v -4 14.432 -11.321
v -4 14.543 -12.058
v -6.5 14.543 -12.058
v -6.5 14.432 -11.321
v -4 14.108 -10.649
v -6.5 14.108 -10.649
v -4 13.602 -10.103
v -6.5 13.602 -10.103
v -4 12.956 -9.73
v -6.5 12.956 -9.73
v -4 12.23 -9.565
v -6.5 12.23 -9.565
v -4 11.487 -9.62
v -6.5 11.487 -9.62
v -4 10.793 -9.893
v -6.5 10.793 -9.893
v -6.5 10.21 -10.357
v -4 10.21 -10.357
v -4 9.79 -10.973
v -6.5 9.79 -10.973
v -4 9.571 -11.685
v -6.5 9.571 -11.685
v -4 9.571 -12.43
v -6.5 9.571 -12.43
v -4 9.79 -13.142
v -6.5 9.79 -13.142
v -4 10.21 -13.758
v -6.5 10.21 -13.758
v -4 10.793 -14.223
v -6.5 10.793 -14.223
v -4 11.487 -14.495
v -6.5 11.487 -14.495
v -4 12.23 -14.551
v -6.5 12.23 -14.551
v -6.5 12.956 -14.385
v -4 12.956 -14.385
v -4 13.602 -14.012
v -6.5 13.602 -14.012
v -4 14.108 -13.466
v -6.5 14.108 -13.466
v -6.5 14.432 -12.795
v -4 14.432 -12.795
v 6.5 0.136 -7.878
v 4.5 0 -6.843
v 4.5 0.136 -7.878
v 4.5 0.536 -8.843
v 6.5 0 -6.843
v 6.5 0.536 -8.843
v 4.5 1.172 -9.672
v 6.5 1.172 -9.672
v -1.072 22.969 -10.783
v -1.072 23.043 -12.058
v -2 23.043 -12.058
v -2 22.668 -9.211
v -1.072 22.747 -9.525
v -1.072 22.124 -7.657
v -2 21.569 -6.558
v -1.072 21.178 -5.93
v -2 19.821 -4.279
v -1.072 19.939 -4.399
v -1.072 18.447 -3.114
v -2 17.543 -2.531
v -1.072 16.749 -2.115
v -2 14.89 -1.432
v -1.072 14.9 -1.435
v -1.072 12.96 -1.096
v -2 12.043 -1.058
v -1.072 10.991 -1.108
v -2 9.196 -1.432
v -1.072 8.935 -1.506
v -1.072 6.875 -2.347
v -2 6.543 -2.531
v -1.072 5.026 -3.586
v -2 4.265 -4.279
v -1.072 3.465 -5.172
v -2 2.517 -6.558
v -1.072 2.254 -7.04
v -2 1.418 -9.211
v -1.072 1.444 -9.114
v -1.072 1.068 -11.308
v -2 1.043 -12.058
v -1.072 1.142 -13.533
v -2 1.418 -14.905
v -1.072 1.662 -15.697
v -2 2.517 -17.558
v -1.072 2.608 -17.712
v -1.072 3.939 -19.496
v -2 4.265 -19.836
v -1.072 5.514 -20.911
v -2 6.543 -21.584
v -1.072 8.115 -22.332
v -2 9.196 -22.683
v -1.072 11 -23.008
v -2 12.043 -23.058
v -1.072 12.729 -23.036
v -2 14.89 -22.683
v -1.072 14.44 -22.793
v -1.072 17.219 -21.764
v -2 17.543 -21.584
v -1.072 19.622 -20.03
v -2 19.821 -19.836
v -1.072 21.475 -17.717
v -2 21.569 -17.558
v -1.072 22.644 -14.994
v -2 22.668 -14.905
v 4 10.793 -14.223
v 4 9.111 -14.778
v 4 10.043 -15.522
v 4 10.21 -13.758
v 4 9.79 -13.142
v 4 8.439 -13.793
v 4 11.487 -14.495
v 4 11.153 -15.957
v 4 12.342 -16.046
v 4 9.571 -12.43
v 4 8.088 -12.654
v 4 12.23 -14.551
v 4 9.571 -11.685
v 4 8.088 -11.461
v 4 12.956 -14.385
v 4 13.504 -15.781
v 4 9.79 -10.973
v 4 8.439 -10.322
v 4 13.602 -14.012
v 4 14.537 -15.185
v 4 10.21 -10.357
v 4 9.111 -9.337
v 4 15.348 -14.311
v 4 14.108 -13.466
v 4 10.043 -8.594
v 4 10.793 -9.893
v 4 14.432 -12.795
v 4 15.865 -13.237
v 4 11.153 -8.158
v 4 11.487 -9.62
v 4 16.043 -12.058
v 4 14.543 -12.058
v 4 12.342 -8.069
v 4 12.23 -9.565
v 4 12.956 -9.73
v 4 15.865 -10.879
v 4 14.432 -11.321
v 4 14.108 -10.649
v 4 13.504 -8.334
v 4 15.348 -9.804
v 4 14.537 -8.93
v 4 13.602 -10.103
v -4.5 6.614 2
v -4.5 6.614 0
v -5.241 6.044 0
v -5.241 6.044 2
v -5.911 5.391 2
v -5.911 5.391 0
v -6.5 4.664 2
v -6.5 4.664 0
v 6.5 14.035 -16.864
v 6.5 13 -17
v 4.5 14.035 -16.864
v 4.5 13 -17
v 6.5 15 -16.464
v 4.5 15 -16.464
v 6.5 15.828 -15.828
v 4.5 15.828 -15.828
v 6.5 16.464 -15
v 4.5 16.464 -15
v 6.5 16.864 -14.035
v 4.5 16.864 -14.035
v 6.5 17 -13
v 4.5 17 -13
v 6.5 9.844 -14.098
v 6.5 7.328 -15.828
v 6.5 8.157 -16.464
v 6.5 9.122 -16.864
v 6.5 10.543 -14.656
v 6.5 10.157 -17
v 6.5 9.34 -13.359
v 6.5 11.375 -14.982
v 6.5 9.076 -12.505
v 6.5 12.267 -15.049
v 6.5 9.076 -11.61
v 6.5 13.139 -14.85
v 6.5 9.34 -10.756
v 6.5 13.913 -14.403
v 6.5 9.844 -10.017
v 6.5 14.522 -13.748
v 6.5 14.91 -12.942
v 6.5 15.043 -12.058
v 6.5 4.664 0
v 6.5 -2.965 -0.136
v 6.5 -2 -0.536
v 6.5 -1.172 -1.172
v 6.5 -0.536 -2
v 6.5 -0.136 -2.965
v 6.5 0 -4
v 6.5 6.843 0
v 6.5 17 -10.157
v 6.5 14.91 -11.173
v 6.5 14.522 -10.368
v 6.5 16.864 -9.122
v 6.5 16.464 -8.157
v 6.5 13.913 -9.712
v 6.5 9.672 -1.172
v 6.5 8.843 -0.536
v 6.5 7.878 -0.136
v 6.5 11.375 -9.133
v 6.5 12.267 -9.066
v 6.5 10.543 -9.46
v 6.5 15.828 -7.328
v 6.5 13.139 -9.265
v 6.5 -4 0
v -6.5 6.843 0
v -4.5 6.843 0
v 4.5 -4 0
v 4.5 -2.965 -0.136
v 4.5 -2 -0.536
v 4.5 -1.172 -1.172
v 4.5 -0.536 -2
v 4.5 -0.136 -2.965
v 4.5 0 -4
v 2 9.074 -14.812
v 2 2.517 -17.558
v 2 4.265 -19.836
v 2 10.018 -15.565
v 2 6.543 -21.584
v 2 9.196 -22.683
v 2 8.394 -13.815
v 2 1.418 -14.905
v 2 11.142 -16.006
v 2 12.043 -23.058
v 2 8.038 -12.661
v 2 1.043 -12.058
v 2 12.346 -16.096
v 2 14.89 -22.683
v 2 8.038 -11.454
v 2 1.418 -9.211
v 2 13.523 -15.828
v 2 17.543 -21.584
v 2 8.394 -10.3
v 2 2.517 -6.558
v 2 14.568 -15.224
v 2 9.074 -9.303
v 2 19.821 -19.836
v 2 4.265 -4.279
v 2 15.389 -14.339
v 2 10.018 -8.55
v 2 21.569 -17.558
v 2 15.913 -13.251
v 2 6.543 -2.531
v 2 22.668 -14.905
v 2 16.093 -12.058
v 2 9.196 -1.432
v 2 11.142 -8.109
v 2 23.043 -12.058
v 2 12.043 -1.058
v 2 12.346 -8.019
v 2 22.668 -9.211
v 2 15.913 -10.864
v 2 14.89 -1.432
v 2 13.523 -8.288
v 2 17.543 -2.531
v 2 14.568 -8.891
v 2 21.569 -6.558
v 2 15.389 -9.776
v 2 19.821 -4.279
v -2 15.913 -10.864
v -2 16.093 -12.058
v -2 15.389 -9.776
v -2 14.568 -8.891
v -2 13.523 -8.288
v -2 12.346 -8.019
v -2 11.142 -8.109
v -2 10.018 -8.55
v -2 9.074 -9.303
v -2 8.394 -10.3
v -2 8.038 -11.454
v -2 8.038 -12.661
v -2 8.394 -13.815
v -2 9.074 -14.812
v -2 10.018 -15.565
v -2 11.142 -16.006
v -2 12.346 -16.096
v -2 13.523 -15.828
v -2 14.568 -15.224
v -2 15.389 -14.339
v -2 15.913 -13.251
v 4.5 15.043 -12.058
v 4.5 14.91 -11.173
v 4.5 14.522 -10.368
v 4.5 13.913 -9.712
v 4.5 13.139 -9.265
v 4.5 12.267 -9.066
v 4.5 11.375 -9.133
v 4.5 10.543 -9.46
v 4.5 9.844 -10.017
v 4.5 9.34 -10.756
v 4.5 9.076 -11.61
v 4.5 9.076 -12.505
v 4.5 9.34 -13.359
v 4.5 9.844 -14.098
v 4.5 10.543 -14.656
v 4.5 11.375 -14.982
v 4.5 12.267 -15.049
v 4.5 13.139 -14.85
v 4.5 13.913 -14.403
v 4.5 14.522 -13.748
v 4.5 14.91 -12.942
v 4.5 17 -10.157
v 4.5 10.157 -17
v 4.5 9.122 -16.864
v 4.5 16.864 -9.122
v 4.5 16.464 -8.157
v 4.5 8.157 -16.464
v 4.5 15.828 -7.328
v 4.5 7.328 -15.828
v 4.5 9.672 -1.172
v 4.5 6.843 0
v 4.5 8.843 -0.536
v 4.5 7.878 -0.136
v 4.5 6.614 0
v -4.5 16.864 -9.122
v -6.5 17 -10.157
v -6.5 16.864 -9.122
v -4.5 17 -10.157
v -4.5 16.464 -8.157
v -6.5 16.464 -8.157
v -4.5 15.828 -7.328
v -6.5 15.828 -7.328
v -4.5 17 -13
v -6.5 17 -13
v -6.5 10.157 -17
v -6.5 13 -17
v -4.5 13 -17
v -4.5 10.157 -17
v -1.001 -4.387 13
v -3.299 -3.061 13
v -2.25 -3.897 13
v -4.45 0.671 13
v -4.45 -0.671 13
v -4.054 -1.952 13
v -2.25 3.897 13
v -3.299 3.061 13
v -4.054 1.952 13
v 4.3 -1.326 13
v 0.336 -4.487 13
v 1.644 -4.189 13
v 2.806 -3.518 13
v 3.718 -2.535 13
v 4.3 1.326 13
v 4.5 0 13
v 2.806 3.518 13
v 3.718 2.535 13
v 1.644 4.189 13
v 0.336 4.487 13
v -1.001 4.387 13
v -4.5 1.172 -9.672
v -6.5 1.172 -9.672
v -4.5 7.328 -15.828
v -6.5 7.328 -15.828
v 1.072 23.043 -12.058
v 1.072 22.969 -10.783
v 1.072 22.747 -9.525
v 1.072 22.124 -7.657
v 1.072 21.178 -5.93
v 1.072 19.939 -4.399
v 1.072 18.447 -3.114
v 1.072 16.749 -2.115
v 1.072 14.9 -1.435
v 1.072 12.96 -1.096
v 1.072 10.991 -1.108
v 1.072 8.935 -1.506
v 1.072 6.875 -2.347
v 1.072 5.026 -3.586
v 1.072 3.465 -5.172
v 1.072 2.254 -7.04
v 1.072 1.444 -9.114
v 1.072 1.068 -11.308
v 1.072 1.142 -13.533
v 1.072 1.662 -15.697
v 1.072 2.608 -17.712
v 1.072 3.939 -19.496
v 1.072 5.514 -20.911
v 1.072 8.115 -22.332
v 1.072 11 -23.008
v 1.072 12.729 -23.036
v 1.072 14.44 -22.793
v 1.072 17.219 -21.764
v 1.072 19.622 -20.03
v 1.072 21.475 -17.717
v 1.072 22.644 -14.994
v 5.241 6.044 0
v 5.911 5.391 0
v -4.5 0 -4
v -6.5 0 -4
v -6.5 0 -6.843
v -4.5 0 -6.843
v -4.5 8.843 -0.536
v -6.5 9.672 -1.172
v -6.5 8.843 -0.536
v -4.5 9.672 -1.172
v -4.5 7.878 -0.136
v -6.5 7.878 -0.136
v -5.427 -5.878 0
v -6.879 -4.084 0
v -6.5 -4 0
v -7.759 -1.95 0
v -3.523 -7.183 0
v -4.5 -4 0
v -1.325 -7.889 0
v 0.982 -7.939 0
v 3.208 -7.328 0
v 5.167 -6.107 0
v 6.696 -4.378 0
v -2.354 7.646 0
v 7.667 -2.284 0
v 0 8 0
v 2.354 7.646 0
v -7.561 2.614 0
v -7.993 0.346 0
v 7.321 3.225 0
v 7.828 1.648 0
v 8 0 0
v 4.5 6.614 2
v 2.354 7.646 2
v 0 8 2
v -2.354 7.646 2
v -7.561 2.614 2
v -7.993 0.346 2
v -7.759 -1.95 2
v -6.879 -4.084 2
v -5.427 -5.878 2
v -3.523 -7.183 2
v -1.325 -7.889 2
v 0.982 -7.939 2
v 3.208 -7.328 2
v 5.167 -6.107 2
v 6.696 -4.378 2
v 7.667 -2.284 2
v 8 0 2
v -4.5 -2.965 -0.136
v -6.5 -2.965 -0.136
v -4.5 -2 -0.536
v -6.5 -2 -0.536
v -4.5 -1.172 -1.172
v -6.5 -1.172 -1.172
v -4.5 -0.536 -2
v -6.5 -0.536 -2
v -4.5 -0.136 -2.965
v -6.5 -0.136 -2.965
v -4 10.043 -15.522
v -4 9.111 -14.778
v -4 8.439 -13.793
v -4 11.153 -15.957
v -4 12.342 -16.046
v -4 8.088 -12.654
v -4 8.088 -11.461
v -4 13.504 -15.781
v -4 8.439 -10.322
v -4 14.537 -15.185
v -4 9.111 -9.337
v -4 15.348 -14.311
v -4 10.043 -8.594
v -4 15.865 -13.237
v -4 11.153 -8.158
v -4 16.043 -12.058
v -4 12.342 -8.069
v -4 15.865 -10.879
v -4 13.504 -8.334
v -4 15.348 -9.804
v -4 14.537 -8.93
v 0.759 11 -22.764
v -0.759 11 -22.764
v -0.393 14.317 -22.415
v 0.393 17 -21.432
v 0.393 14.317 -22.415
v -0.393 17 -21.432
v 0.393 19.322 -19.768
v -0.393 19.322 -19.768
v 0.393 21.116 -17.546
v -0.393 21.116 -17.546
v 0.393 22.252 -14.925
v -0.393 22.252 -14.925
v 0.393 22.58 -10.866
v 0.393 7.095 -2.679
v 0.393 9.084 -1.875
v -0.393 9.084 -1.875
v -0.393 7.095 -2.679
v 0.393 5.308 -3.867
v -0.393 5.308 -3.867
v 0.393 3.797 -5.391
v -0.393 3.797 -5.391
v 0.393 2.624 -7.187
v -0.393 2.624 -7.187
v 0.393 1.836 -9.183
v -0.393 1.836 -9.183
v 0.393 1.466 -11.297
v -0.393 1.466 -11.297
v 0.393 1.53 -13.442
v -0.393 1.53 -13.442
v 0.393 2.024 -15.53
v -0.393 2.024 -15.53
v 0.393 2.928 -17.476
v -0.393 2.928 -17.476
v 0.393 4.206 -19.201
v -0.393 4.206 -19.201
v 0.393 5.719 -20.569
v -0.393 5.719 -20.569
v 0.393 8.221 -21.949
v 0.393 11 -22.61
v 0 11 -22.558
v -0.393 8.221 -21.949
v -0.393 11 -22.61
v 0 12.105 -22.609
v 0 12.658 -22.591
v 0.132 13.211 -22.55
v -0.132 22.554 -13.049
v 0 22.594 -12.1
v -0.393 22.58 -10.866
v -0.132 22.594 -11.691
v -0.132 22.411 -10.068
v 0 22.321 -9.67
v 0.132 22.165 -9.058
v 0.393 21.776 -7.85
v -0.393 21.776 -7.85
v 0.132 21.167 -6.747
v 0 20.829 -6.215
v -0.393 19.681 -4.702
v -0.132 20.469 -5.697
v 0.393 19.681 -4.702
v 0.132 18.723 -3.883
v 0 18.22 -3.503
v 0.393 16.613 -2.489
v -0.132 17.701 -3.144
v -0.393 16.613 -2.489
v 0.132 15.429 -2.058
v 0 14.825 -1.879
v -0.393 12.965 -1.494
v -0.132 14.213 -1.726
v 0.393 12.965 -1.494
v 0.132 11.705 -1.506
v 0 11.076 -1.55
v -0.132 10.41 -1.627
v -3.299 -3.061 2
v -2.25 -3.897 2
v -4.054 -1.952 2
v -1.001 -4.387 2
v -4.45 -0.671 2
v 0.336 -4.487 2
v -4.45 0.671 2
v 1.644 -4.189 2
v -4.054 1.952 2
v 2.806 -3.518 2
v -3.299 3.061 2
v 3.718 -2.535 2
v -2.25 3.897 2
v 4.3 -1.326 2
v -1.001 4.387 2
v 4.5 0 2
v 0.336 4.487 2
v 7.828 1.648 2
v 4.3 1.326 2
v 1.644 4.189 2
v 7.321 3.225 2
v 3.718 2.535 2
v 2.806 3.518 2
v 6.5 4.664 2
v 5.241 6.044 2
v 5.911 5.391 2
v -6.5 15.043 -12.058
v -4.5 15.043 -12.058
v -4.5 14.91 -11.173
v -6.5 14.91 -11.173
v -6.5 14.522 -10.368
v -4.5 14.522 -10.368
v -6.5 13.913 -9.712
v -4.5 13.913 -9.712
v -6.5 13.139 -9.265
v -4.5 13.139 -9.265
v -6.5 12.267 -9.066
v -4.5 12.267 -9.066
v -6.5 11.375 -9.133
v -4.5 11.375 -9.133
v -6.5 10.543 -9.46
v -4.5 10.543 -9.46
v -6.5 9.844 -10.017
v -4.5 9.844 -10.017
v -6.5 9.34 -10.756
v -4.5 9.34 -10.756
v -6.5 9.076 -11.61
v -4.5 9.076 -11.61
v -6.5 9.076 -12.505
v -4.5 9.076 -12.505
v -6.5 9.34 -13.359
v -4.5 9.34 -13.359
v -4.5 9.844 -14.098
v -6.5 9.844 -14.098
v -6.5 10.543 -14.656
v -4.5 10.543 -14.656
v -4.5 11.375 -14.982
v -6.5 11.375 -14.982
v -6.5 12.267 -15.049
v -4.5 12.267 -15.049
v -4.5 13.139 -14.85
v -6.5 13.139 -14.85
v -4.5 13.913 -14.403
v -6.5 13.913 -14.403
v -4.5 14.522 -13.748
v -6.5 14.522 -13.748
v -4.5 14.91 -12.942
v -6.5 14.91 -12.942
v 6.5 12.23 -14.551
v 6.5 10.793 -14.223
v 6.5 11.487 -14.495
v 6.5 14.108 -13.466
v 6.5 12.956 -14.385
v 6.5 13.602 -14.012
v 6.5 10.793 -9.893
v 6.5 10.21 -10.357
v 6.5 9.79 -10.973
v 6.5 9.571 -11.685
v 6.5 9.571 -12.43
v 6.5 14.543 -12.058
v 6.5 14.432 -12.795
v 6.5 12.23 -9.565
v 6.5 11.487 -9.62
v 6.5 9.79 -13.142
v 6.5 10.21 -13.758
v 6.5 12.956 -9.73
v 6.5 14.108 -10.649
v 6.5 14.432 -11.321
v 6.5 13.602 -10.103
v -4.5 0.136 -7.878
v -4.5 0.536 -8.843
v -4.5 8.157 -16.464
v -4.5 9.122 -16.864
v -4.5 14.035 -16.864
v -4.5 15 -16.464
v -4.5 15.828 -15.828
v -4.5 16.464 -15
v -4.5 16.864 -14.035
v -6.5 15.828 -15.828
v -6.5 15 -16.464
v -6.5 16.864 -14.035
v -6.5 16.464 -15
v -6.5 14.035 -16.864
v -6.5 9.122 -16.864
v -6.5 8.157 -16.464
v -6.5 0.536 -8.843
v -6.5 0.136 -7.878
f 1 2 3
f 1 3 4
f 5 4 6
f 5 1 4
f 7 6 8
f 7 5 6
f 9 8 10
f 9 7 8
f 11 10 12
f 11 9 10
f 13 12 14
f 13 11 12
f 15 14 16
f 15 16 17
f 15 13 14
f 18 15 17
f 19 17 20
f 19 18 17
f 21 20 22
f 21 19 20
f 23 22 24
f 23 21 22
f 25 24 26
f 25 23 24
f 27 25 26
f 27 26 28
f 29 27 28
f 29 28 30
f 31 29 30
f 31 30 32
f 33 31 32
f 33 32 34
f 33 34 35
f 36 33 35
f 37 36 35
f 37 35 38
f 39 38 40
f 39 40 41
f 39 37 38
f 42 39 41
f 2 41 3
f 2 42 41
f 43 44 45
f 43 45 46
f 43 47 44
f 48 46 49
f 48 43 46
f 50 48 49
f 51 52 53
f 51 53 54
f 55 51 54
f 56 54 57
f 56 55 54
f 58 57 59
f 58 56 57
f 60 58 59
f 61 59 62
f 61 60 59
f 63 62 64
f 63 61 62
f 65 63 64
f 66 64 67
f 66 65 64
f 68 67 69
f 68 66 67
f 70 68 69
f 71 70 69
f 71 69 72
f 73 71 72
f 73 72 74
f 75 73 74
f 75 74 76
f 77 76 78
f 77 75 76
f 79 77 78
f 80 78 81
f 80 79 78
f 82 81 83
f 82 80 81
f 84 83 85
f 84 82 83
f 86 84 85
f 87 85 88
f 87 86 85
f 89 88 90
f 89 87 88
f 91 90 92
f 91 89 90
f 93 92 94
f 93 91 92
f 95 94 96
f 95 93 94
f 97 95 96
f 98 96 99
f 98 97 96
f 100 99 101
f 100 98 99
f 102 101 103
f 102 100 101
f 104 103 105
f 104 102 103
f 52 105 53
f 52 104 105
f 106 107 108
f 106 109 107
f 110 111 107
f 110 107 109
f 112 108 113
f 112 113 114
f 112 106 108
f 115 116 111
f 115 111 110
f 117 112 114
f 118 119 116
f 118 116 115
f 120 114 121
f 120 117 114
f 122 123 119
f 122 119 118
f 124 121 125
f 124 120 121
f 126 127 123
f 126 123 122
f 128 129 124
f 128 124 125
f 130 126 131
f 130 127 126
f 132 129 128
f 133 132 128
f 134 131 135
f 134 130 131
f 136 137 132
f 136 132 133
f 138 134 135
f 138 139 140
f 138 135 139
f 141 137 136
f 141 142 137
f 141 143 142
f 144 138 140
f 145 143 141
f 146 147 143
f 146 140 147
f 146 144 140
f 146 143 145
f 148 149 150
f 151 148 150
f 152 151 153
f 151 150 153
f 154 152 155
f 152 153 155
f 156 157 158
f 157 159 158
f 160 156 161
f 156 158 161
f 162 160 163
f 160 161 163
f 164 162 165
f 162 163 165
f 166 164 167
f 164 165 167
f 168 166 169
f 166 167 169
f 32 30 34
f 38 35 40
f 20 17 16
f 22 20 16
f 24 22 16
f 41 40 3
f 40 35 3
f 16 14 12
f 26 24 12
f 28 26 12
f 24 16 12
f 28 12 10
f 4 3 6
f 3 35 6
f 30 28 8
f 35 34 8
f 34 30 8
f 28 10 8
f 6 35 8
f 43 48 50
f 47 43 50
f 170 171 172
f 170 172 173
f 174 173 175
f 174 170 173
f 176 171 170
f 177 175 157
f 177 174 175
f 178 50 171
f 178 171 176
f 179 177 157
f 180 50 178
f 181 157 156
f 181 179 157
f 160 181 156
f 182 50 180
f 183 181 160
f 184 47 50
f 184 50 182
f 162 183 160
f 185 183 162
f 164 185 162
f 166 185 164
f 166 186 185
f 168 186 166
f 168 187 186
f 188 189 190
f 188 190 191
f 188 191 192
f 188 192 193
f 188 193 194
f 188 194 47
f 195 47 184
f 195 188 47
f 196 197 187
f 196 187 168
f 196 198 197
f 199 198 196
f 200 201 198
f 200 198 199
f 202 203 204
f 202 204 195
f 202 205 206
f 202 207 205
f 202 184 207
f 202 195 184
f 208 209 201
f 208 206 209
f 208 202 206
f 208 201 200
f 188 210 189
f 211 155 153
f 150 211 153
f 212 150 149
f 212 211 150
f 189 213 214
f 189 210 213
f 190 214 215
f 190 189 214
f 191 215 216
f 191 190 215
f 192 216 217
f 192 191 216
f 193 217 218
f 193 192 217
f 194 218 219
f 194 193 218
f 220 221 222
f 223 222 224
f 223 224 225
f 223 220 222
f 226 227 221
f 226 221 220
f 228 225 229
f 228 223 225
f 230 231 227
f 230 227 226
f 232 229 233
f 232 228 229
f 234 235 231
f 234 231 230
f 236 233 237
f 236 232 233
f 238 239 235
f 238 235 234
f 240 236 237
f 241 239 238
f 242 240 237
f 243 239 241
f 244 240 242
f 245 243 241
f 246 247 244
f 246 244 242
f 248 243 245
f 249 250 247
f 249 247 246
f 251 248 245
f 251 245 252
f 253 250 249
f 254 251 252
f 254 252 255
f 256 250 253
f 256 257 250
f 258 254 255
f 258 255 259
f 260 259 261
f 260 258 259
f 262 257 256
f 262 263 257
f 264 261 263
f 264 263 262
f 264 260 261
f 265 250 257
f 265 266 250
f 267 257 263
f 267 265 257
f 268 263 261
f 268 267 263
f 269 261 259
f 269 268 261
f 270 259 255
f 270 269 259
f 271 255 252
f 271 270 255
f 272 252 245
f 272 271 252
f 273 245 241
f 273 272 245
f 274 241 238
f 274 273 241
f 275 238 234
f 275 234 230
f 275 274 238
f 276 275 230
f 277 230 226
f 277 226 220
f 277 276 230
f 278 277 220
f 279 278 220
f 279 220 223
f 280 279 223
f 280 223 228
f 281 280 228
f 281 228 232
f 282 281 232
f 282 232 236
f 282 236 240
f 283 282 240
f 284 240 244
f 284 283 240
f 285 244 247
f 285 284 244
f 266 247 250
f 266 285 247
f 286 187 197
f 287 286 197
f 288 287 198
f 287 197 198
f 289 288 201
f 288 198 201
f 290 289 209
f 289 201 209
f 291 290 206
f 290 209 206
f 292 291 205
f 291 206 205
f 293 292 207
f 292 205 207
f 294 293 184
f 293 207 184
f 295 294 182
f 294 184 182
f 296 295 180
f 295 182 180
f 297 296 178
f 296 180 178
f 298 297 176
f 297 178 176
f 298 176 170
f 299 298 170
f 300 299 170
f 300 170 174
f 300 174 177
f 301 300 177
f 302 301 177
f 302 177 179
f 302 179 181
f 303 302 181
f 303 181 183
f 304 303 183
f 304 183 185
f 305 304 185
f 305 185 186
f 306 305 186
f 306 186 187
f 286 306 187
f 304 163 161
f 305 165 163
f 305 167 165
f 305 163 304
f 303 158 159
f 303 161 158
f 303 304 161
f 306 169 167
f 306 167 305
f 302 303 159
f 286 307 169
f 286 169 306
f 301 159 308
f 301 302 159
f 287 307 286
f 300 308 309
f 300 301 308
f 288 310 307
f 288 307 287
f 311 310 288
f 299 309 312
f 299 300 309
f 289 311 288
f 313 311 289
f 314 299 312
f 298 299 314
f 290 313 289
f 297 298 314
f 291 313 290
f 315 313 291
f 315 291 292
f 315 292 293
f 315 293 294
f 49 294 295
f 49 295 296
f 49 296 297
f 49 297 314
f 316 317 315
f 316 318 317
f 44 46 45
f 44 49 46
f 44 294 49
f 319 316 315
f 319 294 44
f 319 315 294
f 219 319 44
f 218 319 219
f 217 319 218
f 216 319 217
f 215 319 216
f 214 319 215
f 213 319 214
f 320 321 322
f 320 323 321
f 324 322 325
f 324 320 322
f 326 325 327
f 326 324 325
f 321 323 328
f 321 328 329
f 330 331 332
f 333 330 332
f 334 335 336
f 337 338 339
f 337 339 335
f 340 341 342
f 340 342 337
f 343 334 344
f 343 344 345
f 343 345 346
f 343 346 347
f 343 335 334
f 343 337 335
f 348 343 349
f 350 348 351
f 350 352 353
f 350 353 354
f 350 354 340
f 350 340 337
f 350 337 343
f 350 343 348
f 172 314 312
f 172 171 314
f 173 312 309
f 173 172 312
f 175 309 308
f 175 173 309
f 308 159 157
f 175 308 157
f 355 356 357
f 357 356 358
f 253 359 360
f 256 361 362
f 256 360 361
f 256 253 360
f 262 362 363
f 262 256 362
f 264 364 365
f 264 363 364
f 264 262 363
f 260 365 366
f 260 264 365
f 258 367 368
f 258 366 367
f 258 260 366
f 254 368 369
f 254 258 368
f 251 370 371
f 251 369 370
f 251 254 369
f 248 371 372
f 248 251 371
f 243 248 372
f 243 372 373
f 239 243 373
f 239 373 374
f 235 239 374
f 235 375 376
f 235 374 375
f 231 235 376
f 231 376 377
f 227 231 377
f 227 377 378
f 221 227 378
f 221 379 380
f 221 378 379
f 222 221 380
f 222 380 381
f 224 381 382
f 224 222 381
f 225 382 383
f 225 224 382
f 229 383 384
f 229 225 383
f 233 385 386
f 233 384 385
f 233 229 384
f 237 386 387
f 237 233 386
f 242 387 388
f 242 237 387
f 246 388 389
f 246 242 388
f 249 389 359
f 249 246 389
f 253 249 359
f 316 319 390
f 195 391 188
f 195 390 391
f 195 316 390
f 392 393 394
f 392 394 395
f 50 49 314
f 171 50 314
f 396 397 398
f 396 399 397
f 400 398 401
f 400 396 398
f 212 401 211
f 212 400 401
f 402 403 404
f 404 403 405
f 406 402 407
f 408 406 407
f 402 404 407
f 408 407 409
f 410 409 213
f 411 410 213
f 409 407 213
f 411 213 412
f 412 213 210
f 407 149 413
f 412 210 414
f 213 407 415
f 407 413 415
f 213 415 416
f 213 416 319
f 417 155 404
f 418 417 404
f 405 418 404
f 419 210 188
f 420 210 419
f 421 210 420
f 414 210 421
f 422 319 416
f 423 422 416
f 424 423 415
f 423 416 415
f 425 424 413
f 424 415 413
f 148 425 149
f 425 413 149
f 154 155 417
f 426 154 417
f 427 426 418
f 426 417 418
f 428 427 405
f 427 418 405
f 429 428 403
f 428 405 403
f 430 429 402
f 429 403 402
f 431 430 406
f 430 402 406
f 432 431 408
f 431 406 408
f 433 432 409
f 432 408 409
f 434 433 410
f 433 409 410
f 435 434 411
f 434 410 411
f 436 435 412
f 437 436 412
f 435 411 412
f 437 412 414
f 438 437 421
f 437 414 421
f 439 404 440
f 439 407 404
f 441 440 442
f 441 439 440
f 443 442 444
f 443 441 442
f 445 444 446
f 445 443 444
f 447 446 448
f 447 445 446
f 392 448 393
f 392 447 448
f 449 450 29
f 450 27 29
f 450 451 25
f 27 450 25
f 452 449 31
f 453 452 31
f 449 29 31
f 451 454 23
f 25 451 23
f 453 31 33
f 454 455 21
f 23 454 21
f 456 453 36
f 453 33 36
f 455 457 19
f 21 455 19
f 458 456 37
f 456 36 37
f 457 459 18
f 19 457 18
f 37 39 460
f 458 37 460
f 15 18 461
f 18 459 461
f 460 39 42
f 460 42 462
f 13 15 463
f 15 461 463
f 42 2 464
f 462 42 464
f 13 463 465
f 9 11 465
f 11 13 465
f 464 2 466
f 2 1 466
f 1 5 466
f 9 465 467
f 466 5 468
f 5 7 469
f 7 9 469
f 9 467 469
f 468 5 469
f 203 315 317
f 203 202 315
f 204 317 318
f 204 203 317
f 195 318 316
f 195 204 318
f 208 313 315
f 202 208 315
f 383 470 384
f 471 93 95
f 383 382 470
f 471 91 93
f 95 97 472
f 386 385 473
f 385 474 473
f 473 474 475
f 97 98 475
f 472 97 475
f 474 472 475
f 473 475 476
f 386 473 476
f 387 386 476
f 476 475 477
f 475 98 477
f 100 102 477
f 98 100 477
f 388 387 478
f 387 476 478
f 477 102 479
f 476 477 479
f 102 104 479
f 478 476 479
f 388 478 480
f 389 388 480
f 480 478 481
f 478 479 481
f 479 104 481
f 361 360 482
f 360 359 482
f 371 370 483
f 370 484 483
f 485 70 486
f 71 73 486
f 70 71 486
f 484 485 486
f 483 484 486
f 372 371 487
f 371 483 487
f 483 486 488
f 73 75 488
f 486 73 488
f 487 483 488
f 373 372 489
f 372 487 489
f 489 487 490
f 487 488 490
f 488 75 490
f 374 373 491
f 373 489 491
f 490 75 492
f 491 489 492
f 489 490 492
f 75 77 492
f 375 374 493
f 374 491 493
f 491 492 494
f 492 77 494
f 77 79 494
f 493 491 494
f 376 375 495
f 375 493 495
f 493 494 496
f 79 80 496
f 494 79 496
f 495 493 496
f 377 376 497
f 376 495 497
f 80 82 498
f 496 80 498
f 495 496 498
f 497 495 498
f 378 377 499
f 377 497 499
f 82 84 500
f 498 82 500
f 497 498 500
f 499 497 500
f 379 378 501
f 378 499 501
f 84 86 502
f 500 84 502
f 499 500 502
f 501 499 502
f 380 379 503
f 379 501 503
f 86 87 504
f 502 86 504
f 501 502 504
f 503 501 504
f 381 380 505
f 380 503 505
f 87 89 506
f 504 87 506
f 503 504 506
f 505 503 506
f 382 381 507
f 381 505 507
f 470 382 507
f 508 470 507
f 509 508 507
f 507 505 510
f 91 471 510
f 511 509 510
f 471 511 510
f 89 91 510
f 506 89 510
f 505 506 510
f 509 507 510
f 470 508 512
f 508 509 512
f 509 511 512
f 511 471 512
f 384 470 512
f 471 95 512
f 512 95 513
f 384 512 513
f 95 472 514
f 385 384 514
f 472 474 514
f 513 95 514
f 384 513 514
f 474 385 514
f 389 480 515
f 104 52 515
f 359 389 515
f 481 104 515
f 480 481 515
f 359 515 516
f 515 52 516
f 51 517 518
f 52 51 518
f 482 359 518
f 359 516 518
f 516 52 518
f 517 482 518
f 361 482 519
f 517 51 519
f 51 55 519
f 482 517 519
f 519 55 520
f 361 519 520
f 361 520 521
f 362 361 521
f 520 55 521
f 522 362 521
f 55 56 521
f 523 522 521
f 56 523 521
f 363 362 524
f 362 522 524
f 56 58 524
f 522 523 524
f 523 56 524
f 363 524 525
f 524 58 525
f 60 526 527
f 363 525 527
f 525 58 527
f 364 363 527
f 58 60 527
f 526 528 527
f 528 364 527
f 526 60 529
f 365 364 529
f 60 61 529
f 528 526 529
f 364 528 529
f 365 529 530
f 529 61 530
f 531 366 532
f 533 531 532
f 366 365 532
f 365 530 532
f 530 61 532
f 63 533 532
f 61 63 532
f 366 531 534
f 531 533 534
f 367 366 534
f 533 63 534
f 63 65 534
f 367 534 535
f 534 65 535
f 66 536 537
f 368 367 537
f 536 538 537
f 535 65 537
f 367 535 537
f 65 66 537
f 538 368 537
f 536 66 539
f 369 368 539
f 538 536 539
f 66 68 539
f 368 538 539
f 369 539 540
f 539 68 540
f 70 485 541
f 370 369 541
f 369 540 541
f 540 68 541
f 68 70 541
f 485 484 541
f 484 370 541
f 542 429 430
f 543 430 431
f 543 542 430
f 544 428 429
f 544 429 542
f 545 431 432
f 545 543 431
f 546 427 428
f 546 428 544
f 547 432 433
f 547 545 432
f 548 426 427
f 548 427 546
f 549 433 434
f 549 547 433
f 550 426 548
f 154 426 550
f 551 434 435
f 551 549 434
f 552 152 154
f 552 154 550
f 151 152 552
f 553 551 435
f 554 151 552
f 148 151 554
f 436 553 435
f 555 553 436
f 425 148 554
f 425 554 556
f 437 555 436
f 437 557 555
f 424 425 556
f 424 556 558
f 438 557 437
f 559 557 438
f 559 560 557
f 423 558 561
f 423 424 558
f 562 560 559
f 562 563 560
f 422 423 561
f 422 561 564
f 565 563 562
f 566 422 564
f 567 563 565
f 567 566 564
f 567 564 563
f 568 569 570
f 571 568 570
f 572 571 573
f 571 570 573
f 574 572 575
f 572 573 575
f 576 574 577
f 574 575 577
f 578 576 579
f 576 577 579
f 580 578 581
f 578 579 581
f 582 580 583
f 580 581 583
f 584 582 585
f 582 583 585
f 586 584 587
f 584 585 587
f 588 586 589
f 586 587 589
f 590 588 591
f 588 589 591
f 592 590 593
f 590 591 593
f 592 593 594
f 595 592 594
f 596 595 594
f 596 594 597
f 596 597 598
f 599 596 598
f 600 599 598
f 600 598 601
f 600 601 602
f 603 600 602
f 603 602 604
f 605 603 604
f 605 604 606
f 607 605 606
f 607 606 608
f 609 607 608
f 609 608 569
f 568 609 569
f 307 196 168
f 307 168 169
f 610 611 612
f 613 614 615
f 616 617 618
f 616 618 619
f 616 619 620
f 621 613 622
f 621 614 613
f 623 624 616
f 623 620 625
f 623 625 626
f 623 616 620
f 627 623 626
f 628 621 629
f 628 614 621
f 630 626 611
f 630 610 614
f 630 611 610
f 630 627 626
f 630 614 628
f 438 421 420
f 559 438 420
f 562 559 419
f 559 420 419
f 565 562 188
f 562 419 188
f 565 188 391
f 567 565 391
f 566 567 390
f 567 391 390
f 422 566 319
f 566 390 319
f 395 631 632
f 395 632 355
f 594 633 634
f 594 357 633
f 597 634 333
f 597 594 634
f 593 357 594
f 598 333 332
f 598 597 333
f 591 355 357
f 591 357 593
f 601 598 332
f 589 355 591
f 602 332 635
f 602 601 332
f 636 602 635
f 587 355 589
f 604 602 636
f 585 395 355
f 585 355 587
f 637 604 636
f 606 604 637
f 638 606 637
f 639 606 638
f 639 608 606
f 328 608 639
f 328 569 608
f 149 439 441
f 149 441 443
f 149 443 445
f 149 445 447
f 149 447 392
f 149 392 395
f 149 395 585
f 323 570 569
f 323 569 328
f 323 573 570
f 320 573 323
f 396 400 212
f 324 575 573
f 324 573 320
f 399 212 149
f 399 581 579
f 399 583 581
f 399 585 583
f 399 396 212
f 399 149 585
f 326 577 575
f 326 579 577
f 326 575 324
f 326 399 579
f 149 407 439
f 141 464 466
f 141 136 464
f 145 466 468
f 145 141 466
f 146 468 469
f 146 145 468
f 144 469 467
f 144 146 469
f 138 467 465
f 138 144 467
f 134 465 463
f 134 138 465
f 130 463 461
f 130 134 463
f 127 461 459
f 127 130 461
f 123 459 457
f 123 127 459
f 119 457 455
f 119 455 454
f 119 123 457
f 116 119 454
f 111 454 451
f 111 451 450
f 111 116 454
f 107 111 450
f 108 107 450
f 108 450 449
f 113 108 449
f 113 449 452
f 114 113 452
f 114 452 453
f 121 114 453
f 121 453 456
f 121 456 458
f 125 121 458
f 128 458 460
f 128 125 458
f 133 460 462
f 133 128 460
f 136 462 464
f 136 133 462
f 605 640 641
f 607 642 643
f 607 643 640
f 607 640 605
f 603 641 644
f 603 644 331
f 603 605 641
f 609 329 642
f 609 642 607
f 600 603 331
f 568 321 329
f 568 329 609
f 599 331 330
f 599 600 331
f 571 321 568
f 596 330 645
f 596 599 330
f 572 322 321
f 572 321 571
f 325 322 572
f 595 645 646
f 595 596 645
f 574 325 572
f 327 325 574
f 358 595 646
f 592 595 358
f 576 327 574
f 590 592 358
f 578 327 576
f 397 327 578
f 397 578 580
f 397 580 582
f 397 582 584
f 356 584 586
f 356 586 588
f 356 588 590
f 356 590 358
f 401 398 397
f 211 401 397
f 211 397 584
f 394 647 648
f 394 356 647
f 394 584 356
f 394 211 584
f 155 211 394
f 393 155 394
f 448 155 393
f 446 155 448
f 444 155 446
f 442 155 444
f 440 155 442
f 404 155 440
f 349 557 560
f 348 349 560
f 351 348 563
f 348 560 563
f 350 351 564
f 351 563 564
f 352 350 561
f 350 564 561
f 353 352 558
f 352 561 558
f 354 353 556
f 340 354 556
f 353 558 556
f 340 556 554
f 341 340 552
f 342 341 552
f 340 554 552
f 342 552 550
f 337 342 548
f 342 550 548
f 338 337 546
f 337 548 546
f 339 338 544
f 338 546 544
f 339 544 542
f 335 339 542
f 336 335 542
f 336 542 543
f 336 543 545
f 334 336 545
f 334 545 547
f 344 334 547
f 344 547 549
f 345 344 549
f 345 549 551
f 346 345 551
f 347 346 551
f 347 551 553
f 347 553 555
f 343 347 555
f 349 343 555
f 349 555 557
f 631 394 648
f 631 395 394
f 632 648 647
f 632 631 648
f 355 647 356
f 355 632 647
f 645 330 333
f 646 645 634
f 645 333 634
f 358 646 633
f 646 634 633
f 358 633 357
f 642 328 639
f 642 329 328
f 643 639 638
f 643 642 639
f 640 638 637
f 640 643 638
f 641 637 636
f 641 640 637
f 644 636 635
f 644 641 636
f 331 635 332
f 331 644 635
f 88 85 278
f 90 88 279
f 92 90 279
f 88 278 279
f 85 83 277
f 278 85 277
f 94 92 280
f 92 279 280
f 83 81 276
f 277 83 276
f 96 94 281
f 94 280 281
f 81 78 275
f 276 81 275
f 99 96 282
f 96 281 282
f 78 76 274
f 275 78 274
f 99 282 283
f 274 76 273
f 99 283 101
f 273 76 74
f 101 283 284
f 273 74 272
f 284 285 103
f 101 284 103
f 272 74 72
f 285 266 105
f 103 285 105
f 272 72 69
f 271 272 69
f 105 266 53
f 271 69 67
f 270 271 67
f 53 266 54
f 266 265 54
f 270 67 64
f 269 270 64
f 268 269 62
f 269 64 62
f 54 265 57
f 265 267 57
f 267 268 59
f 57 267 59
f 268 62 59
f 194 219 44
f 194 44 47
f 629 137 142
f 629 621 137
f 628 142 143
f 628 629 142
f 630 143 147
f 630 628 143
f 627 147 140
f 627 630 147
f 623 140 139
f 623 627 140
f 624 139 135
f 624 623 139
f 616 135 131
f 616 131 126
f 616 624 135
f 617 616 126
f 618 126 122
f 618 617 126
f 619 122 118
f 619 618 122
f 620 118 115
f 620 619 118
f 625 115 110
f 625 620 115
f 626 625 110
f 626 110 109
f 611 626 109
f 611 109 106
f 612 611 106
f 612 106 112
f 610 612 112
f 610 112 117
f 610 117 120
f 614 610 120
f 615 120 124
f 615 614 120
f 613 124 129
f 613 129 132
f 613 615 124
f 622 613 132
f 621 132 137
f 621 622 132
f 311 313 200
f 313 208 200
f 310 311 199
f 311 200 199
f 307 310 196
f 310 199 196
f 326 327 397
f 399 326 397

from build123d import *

# Parameters (mm, degrees)
F1_DEPTH  = 13
F2_DEPTH  = 2
F3_DEPTH  = 17
F5_DEPTH  = 14
F6_R      = 4
F7_D      = 6
F8_R      = 11
F8_R_2    = 4.05
F9_DEPTH  = 2
F8_R_3    = 2.5
F10_DEPTH = 6.5
F8_R_4    = 4
F11_DEPTH = 4
F13_R     = 1.5


with BuildPart() as f1:
    # F0 (on Top) → F1 (new body)
    with BuildSketch(Plane.XY):
        with BuildLine():
            ThreePointArc((-4.5, 0), (0, -4.5), (4.5, 0))
            ThreePointArc((4.5, 0), (0, 4.5), (-4.5, 0))
        make_face()
    extrude(amount=F1_DEPTH)

    # F0 (on Top) → F2 (join)
    with BuildSketch(Plane.XY):
        with BuildLine():
            ThreePointArc((-4.5, 0), (0, 4.5), (4.5, 0))
            Line((4.5, 0), (4.5, 6.6143782777))
            ThreePointArc((4.5, 6.6143782777), (0, 8), (-4.5, 6.6143782777))
            Line((-4.5, 6.6143782777), (-4.5, 0))
        make_face()
        with BuildLine():
            Line((-6.5, 0), (-4.5, 0))
            Line((-4.5, 0), (-4.5, 6.6143782777))
            ThreePointArc((-4.5, 6.6143782777), (-5.5858120852, 5.7270152217), (-6.5, 4.6636895265))
            Line((-6.5, 4.6636895265), (-6.5, 0))
        make_face()
        with BuildLine():
            Line((6.5, 0), (4.5, 0))
            ThreePointArc((4.5, 0), (0, -4.5), (-4.5, 0))
            Line((-4.5, 0), (-6.5, 0))
            Line((-6.5, 0), (-6.5, 4.6636895265))
            ThreePointArc((-6.5, 4.6636895265), (-2.4494897428, -7.6157731059), (8, 0))
            ThreePointArc((8, 0), (7.6157731059, 2.4494897428), (6.5, 4.6636895265))
            Line((6.5, 4.6636895265), (6.5, 0))
        make_face()
        with BuildLine():
            Line((4.5, 6.6143782777), (4.5, 0))
            Line((4.5, 0), (6.5, 0))
            Line((6.5, 0), (6.5, 4.6636895265))
            ThreePointArc((6.5, 4.6636895265), (5.5858120852, 5.7270152217), (4.5, 6.6143782777))
        make_face()
    extrude(amount=F2_DEPTH)

    # F0 (on Top) → F3 (join)
    with BuildSketch(Plane.XY):
        with BuildLine():
            ThreePointArc((-6.5, 4.6636895265), (-5.5858120852, 5.7270152217), (-4.5, 6.6143782777))
            Line((-4.5, 6.6143782777), (-4.5, 17))
            Line((-4.5, 17), (-6.5, 17))
            Line((-6.5, 17), (-6.5, 4.6636895265))
        make_face()
        with BuildLine():
            Line((4.5, 17), (4.5, 6.6143782777))
            ThreePointArc((4.5, 6.6143782777), (5.5858120852, 5.7270152217), (6.5, 4.6636895265))
            Line((6.5, 4.6636895265), (6.5, 17))
            Line((6.5, 17), (4.5, 17))
        make_face()
        with BuildLine():
            Line((-6.5, 0), (-4.5, 0))
            Line((-4.5, 0), (-4.5, 6.6143782777))
            ThreePointArc((-4.5, 6.6143782777), (-5.5858120852, 5.7270152217), (-6.5, 4.6636895265))
            Line((-6.5, 4.6636895265), (-6.5, 0))
        make_face()
        with BuildLine():
            Line((4.5, 6.6143782777), (4.5, 0))
            Line((4.5, 0), (6.5, 0))
            Line((6.5, 0), (6.5, 4.6636895265))
            ThreePointArc((6.5, 4.6636895265), (5.5858120852, 5.7270152217), (4.5, 6.6143782777))
        make_face()
    extrude(amount=-F3_DEPTH)

    # F4 (on face) → F5 (cut)
    with BuildSketch(Plane(origin=(-6.5, 0, 0), x_dir=(0, -1, 0), z_dir=(-1, 0, 0))):
        Polygon((-17, 0), (-17, -8.5), (-8.5, 0), align=None)
        Polygon((0, -17), (0, -8.5), (-8.5, -17), align=None)
    extrude(amount=-F5_DEPTH, mode=Mode.SUBTRACT)

    # F6
    f6_edges = [f1.edges().sort_by_distance(p)[0] for p in [
        (-5.5, 17, -17),
        (5.5, 17, -17),
        (-5.5, 0, 0),
        (5.5, 0, 0),
        (-5.5, 0, -8.5),
        (5.5, 0, -8.5),
        (5.5, 8.5, -17),
        (-5.5, 8.5, -17),
        (5.5, 17, -8.5),
        (-5.5, 17, -8.5),
        (5.5, 8.5, 0),
        (-5.5, 8.5, 0),
    ]]
    fillet(f6_edges, radius=F6_R)

    # F7 (through all)
    with Locations(Plane(origin=(-6.5, 0, 0), x_dir=(0, -1, 0), z_dir=(-1, 0, 0))):
        with Locations((-12.0428986898, -12.0576173155)):
            Hole(F7_D / 2)


with BuildPart() as f9:
    # F8 (on Right) → F9 (new body, symmetric)
    with BuildSketch(Plane.YZ):
        with Locations((12.0428986898, -12.0576173155)):
            Circle(F8_R)
        with Locations((12.0428986898, -12.0576173155)):
            Circle(F8_R_2, mode=Mode.SUBTRACT)
    extrude(amount=F9_DEPTH, both=True)

    # F13 (on offset) → F14 (revolve, cut)
    with BuildSketch(Plane.XZ.offset(-11)):
        with Locations((0, -24.0576173155)):
            Circle(F13_R)
    revolve(axis=Axis((2, 12.0428986898, -12.0576173155), (1, 0, 0)), mode=Mode.SUBTRACT)


with BuildPart() as f10:
    # F8 (on Right) → F10 (new body, symmetric)
    with BuildSketch(Plane.YZ):
        with Locations((12.0428986898, -12.0576173155)):
            Circle(F8_R_3)
    extrude(amount=F10_DEPTH, both=True)

    # F8 (on Right) → F11 (join, symmetric)
    with BuildSketch(Plane.YZ):
        with Locations((12.0428986898, -12.0576173155)):
            Circle(F8_R_4)
        with Locations((12.0428986898, -12.0576173155)):
            Circle(F8_R_3, mode=Mode.SUBTRACT)
    extrude(amount=F11_DEPTH, both=True)


solid = Compound([f1.part, f9.part, f10.part])
